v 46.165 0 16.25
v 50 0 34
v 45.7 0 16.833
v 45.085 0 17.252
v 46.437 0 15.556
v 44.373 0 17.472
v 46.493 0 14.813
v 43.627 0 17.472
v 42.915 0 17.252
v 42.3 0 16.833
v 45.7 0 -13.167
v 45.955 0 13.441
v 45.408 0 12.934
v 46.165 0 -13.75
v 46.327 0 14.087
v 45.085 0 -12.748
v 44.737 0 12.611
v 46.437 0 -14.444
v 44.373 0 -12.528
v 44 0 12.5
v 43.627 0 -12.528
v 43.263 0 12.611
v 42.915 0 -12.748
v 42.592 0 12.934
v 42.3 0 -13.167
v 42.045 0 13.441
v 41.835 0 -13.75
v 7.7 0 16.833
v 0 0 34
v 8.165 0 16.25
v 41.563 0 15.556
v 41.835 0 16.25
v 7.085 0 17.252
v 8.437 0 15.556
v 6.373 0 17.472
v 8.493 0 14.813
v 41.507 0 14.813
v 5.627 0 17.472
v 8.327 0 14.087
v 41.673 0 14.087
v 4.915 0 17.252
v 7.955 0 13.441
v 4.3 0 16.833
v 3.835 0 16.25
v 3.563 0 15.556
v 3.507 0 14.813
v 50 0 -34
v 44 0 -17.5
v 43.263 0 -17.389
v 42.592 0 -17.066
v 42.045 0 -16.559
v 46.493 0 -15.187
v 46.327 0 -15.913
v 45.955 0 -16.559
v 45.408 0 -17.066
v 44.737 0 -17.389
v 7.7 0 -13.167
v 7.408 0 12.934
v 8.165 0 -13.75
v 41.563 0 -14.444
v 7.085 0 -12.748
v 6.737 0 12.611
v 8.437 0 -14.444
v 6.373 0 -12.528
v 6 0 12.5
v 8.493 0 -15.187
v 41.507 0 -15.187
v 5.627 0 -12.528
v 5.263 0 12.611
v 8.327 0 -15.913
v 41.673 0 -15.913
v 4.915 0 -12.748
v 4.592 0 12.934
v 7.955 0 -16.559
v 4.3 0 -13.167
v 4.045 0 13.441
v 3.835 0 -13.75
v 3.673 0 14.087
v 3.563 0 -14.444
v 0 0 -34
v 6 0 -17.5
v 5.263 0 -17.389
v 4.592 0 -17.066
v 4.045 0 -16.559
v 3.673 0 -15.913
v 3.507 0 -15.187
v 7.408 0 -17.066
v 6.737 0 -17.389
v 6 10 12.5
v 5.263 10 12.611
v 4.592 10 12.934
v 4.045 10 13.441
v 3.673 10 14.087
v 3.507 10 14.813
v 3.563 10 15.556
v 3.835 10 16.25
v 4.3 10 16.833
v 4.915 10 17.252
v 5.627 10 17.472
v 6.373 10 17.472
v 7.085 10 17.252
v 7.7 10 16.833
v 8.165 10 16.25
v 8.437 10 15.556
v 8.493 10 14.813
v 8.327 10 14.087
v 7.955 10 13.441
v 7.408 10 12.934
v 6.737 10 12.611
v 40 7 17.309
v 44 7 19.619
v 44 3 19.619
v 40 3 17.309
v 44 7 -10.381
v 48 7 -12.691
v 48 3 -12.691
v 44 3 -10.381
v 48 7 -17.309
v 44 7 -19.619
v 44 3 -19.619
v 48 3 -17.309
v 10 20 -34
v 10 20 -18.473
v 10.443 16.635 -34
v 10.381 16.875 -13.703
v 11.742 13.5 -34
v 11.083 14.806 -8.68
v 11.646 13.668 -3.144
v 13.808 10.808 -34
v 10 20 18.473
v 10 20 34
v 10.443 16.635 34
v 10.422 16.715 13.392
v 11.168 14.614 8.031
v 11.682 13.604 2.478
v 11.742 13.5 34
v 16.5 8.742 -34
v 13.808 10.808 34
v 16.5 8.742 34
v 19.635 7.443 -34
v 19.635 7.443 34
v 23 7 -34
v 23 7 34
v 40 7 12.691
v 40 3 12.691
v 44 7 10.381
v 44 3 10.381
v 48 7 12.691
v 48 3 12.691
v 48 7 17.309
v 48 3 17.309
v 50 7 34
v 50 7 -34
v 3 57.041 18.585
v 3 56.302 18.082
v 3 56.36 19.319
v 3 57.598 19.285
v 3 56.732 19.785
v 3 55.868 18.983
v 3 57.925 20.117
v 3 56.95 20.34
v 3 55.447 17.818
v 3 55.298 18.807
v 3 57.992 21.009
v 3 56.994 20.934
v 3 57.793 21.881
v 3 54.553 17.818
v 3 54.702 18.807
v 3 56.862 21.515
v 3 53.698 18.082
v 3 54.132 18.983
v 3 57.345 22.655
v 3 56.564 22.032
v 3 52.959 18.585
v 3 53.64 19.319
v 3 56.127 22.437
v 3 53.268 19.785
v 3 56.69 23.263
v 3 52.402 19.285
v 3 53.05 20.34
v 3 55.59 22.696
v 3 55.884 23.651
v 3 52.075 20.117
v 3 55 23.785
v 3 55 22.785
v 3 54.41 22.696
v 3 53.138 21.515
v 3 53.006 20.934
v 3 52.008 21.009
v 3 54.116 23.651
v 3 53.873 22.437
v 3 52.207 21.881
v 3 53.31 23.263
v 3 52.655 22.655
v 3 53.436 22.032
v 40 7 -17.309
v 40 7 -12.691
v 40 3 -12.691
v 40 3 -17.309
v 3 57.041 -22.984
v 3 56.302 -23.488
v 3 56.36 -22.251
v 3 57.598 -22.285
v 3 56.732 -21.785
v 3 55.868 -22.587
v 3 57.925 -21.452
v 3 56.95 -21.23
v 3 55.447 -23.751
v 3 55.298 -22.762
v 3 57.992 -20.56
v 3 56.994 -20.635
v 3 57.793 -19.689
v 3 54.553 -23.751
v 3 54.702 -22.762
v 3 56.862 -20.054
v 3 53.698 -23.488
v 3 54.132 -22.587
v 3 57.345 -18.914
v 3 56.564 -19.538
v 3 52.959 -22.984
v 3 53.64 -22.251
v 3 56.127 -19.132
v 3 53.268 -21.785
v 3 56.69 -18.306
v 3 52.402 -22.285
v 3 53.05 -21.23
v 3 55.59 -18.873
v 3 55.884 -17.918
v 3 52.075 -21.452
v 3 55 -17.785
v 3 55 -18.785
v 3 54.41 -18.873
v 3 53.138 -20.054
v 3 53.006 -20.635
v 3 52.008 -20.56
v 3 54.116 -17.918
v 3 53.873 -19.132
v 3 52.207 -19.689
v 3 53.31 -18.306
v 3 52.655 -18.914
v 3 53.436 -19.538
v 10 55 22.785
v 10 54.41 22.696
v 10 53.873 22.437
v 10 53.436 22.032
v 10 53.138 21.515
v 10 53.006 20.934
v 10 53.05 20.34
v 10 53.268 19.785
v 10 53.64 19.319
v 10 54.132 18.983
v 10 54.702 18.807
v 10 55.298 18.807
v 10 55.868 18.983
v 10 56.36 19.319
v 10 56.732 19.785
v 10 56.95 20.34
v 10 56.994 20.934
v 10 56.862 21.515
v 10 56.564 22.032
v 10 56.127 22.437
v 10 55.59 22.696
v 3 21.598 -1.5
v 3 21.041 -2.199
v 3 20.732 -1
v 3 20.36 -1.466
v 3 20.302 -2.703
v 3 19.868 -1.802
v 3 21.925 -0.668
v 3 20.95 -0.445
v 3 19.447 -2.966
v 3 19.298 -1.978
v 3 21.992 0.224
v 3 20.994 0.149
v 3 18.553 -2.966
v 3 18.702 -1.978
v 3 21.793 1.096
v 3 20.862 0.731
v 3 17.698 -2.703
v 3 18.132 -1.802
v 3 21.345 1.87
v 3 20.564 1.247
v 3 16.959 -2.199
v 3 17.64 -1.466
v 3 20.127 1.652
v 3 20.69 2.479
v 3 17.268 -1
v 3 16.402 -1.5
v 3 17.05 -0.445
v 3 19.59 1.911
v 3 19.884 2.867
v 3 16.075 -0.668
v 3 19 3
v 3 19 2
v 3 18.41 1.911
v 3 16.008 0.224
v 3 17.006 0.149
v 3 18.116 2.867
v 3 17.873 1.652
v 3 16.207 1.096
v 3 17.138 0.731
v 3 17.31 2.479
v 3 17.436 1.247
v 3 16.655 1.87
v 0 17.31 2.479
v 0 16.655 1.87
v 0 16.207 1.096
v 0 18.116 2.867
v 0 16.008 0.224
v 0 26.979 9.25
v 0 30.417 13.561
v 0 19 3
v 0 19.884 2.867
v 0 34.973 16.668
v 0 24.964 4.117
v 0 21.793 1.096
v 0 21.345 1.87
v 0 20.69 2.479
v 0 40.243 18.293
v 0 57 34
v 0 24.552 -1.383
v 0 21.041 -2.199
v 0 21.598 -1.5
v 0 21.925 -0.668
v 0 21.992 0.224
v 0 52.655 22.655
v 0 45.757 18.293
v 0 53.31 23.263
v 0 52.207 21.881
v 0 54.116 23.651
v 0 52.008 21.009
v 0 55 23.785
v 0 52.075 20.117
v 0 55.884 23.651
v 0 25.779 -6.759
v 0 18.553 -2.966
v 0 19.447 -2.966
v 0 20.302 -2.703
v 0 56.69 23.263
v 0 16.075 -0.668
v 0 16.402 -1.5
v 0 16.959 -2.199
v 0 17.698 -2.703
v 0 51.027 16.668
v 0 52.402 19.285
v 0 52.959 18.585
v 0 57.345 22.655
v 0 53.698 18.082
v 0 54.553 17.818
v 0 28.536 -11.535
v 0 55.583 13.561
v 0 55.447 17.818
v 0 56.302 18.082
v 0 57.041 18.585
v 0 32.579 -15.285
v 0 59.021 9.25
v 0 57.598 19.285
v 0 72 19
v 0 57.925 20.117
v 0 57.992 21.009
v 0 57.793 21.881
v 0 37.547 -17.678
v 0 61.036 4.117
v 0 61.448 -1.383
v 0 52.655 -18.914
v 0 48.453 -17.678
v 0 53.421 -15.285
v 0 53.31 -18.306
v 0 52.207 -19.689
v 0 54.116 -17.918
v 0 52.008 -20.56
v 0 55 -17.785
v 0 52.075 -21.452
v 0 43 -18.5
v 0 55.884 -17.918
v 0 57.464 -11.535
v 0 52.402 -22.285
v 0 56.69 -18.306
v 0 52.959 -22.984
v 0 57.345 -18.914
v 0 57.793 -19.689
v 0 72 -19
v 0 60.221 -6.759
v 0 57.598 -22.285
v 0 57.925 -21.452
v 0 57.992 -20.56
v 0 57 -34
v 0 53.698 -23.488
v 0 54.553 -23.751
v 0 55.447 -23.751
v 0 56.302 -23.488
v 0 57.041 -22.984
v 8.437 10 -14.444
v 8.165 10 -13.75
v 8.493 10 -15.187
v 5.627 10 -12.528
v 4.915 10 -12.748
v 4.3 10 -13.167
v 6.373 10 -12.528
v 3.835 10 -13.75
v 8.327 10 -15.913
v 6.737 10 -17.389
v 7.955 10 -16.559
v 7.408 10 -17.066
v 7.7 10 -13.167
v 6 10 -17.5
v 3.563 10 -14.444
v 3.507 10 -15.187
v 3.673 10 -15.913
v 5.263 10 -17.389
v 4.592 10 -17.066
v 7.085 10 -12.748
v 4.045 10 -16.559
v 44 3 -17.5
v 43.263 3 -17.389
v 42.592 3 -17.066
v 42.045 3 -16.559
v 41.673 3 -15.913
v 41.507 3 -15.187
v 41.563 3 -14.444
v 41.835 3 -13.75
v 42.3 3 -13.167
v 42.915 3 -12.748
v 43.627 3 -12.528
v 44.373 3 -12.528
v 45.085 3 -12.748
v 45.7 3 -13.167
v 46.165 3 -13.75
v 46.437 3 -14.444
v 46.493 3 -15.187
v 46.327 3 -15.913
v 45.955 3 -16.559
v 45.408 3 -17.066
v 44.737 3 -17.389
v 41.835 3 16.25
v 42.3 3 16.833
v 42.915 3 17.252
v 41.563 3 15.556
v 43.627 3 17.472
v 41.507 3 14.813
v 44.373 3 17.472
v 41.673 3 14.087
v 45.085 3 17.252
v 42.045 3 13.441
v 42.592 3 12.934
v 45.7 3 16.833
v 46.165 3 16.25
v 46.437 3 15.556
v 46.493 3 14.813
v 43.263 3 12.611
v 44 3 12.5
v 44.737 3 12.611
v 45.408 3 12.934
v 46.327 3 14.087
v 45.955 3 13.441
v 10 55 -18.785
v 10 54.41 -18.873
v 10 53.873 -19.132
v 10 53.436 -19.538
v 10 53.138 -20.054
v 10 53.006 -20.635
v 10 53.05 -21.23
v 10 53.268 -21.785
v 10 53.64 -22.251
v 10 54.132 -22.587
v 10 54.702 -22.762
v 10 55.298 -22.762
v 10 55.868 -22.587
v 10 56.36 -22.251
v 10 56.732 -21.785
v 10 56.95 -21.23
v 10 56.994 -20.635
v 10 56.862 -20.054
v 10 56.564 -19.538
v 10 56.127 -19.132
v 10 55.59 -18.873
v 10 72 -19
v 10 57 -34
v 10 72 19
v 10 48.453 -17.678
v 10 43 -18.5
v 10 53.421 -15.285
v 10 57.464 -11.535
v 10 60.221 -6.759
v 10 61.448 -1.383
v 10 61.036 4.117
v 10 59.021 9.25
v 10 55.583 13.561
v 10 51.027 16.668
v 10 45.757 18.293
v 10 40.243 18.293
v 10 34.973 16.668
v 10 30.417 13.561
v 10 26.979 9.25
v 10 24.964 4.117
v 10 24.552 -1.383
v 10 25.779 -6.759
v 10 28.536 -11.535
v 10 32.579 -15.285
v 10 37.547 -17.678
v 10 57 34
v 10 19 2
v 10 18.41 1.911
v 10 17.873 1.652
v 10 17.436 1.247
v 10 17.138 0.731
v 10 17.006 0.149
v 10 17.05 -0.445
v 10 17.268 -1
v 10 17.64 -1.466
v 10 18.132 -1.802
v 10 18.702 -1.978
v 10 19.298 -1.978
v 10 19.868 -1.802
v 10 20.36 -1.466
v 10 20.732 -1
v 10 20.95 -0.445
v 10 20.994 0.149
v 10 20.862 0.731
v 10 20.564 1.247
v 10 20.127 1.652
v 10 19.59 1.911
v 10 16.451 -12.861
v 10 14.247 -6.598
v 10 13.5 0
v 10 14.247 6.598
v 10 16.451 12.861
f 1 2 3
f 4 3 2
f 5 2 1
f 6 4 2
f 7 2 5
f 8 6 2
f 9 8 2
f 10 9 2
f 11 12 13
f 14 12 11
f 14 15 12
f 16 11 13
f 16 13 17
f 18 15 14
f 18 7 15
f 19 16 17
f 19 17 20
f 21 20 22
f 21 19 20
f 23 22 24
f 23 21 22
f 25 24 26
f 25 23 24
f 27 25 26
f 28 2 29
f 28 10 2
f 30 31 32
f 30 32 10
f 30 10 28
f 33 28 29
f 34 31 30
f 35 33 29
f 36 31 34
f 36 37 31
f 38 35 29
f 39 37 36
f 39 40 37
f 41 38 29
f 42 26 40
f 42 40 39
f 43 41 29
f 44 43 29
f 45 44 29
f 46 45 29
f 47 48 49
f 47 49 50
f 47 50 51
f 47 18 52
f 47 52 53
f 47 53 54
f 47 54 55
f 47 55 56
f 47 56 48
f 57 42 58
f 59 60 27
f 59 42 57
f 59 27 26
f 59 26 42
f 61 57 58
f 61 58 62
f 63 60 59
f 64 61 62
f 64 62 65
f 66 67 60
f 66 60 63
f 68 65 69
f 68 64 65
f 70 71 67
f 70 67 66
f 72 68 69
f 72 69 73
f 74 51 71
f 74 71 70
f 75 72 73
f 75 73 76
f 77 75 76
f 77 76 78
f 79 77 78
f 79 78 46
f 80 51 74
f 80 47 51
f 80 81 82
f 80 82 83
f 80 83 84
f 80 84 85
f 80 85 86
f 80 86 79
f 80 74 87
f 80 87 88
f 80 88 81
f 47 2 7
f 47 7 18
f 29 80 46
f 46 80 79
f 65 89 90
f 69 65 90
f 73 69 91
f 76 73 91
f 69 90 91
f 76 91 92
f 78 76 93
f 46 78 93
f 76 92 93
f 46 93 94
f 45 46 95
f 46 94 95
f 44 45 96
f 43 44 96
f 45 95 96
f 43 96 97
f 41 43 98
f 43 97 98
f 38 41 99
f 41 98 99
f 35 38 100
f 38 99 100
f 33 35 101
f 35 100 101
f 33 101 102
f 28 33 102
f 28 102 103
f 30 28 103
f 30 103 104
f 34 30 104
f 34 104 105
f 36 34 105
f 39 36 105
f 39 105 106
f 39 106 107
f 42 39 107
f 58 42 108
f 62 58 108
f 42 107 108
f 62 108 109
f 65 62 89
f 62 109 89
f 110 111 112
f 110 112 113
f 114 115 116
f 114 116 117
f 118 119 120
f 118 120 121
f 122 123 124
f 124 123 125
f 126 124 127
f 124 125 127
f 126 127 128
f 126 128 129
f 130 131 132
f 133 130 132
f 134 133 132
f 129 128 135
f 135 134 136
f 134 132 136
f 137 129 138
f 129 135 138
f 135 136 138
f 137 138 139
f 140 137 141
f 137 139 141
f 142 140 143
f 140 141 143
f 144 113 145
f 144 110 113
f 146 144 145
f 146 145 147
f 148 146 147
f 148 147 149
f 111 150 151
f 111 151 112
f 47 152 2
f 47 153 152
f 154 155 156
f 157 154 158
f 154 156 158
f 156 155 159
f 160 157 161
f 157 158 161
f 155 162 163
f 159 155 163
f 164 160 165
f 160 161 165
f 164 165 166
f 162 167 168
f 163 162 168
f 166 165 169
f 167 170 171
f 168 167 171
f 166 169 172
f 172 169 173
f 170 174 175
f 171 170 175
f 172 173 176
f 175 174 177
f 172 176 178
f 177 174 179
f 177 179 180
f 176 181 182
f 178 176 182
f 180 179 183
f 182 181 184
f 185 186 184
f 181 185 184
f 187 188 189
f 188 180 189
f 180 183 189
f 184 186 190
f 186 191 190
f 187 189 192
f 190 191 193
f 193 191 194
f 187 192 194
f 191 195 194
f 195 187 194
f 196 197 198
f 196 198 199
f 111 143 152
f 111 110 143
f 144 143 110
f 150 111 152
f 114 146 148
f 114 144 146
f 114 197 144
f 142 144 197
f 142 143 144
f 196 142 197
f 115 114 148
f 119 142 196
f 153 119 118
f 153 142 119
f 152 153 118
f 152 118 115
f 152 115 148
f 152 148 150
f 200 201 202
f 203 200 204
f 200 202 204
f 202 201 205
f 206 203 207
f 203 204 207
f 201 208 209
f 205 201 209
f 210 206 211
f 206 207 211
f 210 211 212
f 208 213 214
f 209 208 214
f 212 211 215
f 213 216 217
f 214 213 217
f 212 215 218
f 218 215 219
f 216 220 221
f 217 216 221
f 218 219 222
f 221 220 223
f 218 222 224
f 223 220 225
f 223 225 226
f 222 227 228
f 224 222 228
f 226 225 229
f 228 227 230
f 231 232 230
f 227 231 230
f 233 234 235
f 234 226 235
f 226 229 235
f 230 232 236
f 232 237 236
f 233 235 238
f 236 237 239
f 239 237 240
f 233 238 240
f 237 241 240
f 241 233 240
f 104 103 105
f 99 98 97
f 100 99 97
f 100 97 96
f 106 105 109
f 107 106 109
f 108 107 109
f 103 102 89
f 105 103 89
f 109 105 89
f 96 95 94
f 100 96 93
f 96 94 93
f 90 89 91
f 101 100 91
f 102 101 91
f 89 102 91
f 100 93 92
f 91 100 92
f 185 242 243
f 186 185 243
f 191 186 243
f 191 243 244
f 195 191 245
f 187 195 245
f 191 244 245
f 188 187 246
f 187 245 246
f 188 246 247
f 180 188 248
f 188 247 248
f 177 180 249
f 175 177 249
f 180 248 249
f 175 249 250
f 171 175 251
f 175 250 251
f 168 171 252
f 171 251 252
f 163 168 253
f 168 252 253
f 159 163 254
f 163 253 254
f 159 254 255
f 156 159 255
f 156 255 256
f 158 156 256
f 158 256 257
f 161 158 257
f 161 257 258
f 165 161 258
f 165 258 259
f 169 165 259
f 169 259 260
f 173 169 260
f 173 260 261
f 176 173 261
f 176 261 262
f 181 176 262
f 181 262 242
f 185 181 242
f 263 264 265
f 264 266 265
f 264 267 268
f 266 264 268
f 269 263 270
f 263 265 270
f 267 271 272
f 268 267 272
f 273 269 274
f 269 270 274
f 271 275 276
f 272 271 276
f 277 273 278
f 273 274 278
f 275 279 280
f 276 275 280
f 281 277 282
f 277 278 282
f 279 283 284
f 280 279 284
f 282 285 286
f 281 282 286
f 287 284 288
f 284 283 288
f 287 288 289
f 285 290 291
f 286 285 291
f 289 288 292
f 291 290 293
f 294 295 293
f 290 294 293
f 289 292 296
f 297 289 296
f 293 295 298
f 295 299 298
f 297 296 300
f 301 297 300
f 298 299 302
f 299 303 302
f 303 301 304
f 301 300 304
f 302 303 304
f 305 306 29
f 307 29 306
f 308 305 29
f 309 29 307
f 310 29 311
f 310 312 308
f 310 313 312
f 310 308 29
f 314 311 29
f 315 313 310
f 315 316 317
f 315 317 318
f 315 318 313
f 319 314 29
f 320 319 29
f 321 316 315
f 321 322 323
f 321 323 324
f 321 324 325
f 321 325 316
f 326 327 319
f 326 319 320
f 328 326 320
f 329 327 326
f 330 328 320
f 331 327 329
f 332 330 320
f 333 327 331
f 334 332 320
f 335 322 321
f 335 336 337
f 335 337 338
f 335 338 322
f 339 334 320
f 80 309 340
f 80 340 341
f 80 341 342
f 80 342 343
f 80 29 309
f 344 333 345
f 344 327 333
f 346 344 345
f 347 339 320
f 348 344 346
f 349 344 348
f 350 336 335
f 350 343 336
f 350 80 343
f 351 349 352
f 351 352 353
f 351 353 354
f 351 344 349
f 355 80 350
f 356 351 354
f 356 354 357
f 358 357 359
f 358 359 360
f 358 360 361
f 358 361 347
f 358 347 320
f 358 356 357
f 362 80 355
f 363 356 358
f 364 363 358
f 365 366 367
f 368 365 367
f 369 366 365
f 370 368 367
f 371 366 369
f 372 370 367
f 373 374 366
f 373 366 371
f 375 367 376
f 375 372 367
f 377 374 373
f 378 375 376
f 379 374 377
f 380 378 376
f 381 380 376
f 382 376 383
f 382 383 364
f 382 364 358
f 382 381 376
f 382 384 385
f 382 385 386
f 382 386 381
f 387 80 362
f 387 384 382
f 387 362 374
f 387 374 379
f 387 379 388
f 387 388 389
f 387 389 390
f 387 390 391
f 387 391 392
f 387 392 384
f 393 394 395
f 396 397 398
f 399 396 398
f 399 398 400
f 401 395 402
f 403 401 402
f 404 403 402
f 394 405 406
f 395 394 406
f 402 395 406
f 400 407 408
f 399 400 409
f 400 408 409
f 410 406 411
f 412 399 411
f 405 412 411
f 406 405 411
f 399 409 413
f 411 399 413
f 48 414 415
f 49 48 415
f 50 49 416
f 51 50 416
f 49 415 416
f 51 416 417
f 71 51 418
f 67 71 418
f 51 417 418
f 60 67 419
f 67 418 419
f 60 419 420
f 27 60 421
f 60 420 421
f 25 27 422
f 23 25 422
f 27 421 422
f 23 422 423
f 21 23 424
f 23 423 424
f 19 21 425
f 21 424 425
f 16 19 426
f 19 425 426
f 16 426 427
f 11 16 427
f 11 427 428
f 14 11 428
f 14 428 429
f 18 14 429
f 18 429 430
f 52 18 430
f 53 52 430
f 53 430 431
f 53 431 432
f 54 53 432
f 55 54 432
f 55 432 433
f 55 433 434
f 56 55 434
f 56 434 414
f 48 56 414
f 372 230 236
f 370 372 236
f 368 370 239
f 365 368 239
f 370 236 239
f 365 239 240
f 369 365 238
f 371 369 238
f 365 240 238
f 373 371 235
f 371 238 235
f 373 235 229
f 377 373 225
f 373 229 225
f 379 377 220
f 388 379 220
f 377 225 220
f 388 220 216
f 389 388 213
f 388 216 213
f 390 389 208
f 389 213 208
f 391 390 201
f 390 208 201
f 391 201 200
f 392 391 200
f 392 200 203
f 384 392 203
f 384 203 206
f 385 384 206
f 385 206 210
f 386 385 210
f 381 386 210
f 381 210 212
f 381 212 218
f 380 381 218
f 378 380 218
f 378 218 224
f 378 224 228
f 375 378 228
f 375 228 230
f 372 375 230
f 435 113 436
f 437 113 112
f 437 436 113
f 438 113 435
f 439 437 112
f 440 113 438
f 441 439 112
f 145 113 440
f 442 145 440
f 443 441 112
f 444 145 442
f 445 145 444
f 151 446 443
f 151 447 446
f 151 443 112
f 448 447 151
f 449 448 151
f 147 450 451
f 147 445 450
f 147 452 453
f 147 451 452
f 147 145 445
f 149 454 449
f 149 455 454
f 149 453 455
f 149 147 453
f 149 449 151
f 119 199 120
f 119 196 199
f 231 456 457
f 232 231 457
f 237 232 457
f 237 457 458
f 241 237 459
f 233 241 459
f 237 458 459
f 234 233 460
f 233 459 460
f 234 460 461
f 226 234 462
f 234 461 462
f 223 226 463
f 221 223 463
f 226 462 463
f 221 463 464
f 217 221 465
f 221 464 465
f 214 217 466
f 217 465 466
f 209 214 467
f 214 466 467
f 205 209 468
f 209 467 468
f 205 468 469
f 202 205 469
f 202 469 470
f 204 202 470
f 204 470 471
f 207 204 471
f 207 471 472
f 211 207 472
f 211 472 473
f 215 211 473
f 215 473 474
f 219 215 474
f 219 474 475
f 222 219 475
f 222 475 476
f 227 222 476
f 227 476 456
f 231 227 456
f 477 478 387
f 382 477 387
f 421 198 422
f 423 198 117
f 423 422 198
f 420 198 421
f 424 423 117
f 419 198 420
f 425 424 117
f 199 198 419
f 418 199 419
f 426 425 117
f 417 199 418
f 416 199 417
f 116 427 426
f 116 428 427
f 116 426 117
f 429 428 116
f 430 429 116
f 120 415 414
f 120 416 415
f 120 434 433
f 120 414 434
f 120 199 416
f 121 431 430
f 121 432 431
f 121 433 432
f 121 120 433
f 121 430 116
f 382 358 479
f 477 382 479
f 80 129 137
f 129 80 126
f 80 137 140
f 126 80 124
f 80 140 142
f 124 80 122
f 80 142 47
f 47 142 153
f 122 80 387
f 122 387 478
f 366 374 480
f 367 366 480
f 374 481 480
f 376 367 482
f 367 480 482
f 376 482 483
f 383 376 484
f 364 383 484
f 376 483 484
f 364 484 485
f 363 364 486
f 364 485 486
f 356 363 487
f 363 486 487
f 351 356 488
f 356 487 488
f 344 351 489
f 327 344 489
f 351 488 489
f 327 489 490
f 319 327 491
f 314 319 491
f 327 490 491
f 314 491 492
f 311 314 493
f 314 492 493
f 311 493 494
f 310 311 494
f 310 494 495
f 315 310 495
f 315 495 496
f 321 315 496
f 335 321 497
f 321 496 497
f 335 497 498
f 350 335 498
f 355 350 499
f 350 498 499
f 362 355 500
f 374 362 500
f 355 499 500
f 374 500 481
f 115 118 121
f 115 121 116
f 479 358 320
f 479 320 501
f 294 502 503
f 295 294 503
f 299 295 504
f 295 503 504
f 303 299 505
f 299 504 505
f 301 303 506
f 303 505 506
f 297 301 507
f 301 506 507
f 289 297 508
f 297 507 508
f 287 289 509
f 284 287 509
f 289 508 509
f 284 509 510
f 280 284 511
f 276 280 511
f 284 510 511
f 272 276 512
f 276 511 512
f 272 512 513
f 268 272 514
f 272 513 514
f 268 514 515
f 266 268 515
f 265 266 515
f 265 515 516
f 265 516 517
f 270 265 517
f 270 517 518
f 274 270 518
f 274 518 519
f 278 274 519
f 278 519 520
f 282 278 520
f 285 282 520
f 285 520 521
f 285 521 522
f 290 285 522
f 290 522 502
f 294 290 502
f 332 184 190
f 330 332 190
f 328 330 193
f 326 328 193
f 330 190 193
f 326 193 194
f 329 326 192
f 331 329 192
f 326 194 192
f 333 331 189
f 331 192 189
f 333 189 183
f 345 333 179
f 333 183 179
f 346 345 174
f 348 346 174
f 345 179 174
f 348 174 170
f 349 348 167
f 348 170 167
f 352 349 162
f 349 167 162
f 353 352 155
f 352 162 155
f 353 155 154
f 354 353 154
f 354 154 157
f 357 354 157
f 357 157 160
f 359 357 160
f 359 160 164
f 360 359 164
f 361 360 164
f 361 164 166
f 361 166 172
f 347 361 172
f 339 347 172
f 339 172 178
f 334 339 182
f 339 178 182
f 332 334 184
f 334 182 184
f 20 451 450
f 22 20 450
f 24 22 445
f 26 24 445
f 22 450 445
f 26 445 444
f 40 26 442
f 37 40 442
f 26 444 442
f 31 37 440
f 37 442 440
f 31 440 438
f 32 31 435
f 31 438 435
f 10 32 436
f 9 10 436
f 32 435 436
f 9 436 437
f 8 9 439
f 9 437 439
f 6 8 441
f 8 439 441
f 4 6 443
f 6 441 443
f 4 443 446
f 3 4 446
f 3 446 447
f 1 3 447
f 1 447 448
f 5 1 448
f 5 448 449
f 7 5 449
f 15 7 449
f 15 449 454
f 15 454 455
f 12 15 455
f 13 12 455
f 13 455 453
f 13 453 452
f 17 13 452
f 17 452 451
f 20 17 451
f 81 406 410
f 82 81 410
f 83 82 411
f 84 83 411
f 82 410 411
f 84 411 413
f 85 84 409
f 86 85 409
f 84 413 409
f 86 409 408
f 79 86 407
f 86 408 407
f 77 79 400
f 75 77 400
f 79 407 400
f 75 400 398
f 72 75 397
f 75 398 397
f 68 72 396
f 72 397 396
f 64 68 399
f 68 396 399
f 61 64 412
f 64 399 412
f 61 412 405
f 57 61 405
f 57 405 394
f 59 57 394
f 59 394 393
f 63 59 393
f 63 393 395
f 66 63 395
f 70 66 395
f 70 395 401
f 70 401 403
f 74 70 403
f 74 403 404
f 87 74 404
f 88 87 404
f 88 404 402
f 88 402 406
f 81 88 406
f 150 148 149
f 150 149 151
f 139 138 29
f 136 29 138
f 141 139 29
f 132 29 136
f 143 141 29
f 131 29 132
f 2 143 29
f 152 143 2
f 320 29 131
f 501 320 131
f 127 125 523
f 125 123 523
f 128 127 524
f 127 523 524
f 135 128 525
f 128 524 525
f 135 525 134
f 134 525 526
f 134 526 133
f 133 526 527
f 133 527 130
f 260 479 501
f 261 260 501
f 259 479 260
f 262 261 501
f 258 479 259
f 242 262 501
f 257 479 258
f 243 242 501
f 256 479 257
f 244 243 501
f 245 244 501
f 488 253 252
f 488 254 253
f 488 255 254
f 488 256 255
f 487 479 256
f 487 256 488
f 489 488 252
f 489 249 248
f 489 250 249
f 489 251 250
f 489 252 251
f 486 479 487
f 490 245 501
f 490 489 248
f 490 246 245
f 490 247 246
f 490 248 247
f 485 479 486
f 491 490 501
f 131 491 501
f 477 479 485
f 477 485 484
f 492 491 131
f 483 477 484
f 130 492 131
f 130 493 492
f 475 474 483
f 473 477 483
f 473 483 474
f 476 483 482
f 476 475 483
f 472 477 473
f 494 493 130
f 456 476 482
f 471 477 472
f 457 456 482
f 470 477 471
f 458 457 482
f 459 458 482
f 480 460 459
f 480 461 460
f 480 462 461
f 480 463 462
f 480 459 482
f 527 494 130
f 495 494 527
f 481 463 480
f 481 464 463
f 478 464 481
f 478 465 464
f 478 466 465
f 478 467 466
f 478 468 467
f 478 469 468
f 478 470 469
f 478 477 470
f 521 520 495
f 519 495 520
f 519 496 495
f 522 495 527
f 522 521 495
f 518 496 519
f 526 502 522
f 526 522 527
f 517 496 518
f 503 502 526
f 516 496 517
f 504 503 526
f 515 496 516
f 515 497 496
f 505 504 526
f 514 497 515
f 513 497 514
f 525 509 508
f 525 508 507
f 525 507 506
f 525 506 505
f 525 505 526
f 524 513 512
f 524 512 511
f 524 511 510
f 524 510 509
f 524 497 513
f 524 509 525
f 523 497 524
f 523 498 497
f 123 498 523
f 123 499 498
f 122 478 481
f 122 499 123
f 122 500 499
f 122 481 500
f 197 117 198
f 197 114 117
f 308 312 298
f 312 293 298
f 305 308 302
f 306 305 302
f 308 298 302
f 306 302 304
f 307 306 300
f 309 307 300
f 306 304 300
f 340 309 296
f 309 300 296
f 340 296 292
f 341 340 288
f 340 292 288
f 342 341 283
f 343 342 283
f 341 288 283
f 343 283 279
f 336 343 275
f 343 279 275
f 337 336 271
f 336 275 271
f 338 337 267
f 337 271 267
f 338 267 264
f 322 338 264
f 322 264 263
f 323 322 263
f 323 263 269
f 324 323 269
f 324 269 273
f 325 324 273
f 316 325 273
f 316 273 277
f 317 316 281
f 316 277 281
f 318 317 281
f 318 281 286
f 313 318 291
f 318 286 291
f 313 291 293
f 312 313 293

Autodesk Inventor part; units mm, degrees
ref_plane "YZ Plane" through (0, 0, 0) normal (1, 0, 0) x (0, 1, 0)
ref_plane "XZ Plane" through (0, 0, 0) normal (0, 1, 0) x (-1, 0, 0)
ref_plane "XY Plane" through (0, 0, 0) normal (0, 0, 1) x (1, 0, 0)
sketch "Skizze1" plane through (0, 0, 0) normal (0, 0, 1) x (1, 0, 0)
  line L0 (0, 0) -> (0, 72)
  line L1 (0, 72) -> (10, 72)
  line L2 (10, 72) -> (10, 7)
  line L3 (10, 7) -> (50, 7)
  line L4 (50, 7) -> (50, 0)
  line L5 (50, 0) -> (0, 0)
  dimension "d0" = 50
  dimension "d27" = 7
  dimension "d43" = 10
  dimension "d45" = 72
extrude "Extrusion1" add sketch "Skizze1" along normal mid plane 68
sketch "Skizze3" plane through (0, 0, 34) normal (0, -1, 0) x (1, 0, 0)
  line L0 (0, -68) -> (0, 0) projected
  line L1 (50, -68) -> (0, -68) projected
  point P0 (0, -34)
  point P1 (6, -49)
  point P2 (6, -19)
  dimension "d16" = 6
  dimension "d17" = 19
  dimension "d18" = 30
  dimension "d19" = 0
hole "Bohrung2" at (6, 0, -15) at (6, 0, 15) direction (0, 1, 0) diameter 5 depth 10
sketch "Skizze4" plane through (0, 0, 34) normal (0, -1, 0) x (1, 0, 0)
  circle A0 centre (6, -49) radius 2.5 projected
  circle A1 centre (6, -19) radius 2.5 projected
  point P0 (0, -34)
  point P1 (44, -49)
  point P2 (44, -19)
  dimension "d28" = 38
  dimension "d29" = 38
  dimension "d30" = 0
  dimension "d31" = 0
hole "Bohrung3" at (44, 0, -15) at (44, 0, 15) direction (0, 1, 0) diameter 5 end up to surface
sketch "Skizze5" plane through (10, 7, 34) normal (1, 0, 0) x (0, 0, -1)
  circle A0 centre (34, 36) radius 18.5
  line L0 (0, 0) -> (68, 0) projected
  point P0 (34, -7)
  dimension "d42" = 37
  dimension "d46" = 36
  dimension "d47" = 0
extrude "Extrusion2" cut sketch "Skizze5" against normal up to surface (10 mm away)
sketch "Skizze8" plane through (20, 7, 34) normal (0, 1, 0) x (1, 0, 0)
  circle A0 centre (24, 19) radius 2.5 projected
  circle A1 centre (24, 49) radius 2.5 projected
  line L0 (28, 21.3094) -> (28, 16.6906)
  line L1 (28, 16.6906) -> (24, 14.3812)
  line L2 (24, 14.3812) -> (20, 16.6906)
  line L3 (20, 16.6906) -> (20, 21.3094)
  line L4 (20, 21.3094) -> (24, 23.6188)
  line L5 (24, 23.6188) -> (28, 21.3094)
  line L6 (24, 44.3812) -> (20, 46.6906)
  line L7 (20, 46.6906) -> (20, 51.3094)
  line L8 (20, 51.3094) -> (24, 53.6188)
  line L9 (24, 53.6188) -> (28, 51.3094)
  line L10 (28, 51.3094) -> (28, 46.6906)
  line L11 (28, 46.6906) -> (24, 44.3812)
  line L12 (30, 0) -> (30, 68) projected
  point P0 (-20, 34)
  point P1 (24, 19)
  point P2 (24, 49)
  dimension "d54" = 8
  dimension "d55" = 8
extrude "Extrusion4" cut sketch "Skizze8" against normal blind 4
chamfer "Fase2" distance 15 angle 45 2 edges at (5, 72, -34) (5, 72, 34)
sketch "Skizze9" plane through (0, 0, -34) normal (-1, 0, 0) x (0, 0, 1)
  circle A0 centre (34, 43) radius 18.5 projected
  circle A1 centre (34, 43) radius 18.5 projected
  point P0 (34, 19)
  dimension "d84" = 0
  dimension "d85" = 24
hole "Bohrung4" at (0, 19, 0) direction (1, 0, 0) diameter 4 end up to surface counterbore diameter 6 counterbore depth 3
pattern_circular "Runde Anordnung1" count 3 over 360 about axis through (10, 43, 0) along (-1, 0, 0) of "Bohrung4"
fillet "Rundung1" radius 13 1 edges at (10, 7, 0)
sketch "Skizze11" plane through (10, 72, 19) normal (1, 0, 0) x (0, 0, -1)
  circle A0 centre (19, -29) radius 18.5 projected
  circle A1 centre (19, -29) radius 18.5 projected
  circle A2 centre (19, -29) radius 29.5
  point P0 (19, -72)
  dimension "d90" = 59
extrude "Extrusion5" cut sketch "Skizze11" along normal blind 10
equation "\"d29\" = d28"
equation "\"d55\" = d54"
properties part number "encoder_adapter" material "ABS Plastic"
